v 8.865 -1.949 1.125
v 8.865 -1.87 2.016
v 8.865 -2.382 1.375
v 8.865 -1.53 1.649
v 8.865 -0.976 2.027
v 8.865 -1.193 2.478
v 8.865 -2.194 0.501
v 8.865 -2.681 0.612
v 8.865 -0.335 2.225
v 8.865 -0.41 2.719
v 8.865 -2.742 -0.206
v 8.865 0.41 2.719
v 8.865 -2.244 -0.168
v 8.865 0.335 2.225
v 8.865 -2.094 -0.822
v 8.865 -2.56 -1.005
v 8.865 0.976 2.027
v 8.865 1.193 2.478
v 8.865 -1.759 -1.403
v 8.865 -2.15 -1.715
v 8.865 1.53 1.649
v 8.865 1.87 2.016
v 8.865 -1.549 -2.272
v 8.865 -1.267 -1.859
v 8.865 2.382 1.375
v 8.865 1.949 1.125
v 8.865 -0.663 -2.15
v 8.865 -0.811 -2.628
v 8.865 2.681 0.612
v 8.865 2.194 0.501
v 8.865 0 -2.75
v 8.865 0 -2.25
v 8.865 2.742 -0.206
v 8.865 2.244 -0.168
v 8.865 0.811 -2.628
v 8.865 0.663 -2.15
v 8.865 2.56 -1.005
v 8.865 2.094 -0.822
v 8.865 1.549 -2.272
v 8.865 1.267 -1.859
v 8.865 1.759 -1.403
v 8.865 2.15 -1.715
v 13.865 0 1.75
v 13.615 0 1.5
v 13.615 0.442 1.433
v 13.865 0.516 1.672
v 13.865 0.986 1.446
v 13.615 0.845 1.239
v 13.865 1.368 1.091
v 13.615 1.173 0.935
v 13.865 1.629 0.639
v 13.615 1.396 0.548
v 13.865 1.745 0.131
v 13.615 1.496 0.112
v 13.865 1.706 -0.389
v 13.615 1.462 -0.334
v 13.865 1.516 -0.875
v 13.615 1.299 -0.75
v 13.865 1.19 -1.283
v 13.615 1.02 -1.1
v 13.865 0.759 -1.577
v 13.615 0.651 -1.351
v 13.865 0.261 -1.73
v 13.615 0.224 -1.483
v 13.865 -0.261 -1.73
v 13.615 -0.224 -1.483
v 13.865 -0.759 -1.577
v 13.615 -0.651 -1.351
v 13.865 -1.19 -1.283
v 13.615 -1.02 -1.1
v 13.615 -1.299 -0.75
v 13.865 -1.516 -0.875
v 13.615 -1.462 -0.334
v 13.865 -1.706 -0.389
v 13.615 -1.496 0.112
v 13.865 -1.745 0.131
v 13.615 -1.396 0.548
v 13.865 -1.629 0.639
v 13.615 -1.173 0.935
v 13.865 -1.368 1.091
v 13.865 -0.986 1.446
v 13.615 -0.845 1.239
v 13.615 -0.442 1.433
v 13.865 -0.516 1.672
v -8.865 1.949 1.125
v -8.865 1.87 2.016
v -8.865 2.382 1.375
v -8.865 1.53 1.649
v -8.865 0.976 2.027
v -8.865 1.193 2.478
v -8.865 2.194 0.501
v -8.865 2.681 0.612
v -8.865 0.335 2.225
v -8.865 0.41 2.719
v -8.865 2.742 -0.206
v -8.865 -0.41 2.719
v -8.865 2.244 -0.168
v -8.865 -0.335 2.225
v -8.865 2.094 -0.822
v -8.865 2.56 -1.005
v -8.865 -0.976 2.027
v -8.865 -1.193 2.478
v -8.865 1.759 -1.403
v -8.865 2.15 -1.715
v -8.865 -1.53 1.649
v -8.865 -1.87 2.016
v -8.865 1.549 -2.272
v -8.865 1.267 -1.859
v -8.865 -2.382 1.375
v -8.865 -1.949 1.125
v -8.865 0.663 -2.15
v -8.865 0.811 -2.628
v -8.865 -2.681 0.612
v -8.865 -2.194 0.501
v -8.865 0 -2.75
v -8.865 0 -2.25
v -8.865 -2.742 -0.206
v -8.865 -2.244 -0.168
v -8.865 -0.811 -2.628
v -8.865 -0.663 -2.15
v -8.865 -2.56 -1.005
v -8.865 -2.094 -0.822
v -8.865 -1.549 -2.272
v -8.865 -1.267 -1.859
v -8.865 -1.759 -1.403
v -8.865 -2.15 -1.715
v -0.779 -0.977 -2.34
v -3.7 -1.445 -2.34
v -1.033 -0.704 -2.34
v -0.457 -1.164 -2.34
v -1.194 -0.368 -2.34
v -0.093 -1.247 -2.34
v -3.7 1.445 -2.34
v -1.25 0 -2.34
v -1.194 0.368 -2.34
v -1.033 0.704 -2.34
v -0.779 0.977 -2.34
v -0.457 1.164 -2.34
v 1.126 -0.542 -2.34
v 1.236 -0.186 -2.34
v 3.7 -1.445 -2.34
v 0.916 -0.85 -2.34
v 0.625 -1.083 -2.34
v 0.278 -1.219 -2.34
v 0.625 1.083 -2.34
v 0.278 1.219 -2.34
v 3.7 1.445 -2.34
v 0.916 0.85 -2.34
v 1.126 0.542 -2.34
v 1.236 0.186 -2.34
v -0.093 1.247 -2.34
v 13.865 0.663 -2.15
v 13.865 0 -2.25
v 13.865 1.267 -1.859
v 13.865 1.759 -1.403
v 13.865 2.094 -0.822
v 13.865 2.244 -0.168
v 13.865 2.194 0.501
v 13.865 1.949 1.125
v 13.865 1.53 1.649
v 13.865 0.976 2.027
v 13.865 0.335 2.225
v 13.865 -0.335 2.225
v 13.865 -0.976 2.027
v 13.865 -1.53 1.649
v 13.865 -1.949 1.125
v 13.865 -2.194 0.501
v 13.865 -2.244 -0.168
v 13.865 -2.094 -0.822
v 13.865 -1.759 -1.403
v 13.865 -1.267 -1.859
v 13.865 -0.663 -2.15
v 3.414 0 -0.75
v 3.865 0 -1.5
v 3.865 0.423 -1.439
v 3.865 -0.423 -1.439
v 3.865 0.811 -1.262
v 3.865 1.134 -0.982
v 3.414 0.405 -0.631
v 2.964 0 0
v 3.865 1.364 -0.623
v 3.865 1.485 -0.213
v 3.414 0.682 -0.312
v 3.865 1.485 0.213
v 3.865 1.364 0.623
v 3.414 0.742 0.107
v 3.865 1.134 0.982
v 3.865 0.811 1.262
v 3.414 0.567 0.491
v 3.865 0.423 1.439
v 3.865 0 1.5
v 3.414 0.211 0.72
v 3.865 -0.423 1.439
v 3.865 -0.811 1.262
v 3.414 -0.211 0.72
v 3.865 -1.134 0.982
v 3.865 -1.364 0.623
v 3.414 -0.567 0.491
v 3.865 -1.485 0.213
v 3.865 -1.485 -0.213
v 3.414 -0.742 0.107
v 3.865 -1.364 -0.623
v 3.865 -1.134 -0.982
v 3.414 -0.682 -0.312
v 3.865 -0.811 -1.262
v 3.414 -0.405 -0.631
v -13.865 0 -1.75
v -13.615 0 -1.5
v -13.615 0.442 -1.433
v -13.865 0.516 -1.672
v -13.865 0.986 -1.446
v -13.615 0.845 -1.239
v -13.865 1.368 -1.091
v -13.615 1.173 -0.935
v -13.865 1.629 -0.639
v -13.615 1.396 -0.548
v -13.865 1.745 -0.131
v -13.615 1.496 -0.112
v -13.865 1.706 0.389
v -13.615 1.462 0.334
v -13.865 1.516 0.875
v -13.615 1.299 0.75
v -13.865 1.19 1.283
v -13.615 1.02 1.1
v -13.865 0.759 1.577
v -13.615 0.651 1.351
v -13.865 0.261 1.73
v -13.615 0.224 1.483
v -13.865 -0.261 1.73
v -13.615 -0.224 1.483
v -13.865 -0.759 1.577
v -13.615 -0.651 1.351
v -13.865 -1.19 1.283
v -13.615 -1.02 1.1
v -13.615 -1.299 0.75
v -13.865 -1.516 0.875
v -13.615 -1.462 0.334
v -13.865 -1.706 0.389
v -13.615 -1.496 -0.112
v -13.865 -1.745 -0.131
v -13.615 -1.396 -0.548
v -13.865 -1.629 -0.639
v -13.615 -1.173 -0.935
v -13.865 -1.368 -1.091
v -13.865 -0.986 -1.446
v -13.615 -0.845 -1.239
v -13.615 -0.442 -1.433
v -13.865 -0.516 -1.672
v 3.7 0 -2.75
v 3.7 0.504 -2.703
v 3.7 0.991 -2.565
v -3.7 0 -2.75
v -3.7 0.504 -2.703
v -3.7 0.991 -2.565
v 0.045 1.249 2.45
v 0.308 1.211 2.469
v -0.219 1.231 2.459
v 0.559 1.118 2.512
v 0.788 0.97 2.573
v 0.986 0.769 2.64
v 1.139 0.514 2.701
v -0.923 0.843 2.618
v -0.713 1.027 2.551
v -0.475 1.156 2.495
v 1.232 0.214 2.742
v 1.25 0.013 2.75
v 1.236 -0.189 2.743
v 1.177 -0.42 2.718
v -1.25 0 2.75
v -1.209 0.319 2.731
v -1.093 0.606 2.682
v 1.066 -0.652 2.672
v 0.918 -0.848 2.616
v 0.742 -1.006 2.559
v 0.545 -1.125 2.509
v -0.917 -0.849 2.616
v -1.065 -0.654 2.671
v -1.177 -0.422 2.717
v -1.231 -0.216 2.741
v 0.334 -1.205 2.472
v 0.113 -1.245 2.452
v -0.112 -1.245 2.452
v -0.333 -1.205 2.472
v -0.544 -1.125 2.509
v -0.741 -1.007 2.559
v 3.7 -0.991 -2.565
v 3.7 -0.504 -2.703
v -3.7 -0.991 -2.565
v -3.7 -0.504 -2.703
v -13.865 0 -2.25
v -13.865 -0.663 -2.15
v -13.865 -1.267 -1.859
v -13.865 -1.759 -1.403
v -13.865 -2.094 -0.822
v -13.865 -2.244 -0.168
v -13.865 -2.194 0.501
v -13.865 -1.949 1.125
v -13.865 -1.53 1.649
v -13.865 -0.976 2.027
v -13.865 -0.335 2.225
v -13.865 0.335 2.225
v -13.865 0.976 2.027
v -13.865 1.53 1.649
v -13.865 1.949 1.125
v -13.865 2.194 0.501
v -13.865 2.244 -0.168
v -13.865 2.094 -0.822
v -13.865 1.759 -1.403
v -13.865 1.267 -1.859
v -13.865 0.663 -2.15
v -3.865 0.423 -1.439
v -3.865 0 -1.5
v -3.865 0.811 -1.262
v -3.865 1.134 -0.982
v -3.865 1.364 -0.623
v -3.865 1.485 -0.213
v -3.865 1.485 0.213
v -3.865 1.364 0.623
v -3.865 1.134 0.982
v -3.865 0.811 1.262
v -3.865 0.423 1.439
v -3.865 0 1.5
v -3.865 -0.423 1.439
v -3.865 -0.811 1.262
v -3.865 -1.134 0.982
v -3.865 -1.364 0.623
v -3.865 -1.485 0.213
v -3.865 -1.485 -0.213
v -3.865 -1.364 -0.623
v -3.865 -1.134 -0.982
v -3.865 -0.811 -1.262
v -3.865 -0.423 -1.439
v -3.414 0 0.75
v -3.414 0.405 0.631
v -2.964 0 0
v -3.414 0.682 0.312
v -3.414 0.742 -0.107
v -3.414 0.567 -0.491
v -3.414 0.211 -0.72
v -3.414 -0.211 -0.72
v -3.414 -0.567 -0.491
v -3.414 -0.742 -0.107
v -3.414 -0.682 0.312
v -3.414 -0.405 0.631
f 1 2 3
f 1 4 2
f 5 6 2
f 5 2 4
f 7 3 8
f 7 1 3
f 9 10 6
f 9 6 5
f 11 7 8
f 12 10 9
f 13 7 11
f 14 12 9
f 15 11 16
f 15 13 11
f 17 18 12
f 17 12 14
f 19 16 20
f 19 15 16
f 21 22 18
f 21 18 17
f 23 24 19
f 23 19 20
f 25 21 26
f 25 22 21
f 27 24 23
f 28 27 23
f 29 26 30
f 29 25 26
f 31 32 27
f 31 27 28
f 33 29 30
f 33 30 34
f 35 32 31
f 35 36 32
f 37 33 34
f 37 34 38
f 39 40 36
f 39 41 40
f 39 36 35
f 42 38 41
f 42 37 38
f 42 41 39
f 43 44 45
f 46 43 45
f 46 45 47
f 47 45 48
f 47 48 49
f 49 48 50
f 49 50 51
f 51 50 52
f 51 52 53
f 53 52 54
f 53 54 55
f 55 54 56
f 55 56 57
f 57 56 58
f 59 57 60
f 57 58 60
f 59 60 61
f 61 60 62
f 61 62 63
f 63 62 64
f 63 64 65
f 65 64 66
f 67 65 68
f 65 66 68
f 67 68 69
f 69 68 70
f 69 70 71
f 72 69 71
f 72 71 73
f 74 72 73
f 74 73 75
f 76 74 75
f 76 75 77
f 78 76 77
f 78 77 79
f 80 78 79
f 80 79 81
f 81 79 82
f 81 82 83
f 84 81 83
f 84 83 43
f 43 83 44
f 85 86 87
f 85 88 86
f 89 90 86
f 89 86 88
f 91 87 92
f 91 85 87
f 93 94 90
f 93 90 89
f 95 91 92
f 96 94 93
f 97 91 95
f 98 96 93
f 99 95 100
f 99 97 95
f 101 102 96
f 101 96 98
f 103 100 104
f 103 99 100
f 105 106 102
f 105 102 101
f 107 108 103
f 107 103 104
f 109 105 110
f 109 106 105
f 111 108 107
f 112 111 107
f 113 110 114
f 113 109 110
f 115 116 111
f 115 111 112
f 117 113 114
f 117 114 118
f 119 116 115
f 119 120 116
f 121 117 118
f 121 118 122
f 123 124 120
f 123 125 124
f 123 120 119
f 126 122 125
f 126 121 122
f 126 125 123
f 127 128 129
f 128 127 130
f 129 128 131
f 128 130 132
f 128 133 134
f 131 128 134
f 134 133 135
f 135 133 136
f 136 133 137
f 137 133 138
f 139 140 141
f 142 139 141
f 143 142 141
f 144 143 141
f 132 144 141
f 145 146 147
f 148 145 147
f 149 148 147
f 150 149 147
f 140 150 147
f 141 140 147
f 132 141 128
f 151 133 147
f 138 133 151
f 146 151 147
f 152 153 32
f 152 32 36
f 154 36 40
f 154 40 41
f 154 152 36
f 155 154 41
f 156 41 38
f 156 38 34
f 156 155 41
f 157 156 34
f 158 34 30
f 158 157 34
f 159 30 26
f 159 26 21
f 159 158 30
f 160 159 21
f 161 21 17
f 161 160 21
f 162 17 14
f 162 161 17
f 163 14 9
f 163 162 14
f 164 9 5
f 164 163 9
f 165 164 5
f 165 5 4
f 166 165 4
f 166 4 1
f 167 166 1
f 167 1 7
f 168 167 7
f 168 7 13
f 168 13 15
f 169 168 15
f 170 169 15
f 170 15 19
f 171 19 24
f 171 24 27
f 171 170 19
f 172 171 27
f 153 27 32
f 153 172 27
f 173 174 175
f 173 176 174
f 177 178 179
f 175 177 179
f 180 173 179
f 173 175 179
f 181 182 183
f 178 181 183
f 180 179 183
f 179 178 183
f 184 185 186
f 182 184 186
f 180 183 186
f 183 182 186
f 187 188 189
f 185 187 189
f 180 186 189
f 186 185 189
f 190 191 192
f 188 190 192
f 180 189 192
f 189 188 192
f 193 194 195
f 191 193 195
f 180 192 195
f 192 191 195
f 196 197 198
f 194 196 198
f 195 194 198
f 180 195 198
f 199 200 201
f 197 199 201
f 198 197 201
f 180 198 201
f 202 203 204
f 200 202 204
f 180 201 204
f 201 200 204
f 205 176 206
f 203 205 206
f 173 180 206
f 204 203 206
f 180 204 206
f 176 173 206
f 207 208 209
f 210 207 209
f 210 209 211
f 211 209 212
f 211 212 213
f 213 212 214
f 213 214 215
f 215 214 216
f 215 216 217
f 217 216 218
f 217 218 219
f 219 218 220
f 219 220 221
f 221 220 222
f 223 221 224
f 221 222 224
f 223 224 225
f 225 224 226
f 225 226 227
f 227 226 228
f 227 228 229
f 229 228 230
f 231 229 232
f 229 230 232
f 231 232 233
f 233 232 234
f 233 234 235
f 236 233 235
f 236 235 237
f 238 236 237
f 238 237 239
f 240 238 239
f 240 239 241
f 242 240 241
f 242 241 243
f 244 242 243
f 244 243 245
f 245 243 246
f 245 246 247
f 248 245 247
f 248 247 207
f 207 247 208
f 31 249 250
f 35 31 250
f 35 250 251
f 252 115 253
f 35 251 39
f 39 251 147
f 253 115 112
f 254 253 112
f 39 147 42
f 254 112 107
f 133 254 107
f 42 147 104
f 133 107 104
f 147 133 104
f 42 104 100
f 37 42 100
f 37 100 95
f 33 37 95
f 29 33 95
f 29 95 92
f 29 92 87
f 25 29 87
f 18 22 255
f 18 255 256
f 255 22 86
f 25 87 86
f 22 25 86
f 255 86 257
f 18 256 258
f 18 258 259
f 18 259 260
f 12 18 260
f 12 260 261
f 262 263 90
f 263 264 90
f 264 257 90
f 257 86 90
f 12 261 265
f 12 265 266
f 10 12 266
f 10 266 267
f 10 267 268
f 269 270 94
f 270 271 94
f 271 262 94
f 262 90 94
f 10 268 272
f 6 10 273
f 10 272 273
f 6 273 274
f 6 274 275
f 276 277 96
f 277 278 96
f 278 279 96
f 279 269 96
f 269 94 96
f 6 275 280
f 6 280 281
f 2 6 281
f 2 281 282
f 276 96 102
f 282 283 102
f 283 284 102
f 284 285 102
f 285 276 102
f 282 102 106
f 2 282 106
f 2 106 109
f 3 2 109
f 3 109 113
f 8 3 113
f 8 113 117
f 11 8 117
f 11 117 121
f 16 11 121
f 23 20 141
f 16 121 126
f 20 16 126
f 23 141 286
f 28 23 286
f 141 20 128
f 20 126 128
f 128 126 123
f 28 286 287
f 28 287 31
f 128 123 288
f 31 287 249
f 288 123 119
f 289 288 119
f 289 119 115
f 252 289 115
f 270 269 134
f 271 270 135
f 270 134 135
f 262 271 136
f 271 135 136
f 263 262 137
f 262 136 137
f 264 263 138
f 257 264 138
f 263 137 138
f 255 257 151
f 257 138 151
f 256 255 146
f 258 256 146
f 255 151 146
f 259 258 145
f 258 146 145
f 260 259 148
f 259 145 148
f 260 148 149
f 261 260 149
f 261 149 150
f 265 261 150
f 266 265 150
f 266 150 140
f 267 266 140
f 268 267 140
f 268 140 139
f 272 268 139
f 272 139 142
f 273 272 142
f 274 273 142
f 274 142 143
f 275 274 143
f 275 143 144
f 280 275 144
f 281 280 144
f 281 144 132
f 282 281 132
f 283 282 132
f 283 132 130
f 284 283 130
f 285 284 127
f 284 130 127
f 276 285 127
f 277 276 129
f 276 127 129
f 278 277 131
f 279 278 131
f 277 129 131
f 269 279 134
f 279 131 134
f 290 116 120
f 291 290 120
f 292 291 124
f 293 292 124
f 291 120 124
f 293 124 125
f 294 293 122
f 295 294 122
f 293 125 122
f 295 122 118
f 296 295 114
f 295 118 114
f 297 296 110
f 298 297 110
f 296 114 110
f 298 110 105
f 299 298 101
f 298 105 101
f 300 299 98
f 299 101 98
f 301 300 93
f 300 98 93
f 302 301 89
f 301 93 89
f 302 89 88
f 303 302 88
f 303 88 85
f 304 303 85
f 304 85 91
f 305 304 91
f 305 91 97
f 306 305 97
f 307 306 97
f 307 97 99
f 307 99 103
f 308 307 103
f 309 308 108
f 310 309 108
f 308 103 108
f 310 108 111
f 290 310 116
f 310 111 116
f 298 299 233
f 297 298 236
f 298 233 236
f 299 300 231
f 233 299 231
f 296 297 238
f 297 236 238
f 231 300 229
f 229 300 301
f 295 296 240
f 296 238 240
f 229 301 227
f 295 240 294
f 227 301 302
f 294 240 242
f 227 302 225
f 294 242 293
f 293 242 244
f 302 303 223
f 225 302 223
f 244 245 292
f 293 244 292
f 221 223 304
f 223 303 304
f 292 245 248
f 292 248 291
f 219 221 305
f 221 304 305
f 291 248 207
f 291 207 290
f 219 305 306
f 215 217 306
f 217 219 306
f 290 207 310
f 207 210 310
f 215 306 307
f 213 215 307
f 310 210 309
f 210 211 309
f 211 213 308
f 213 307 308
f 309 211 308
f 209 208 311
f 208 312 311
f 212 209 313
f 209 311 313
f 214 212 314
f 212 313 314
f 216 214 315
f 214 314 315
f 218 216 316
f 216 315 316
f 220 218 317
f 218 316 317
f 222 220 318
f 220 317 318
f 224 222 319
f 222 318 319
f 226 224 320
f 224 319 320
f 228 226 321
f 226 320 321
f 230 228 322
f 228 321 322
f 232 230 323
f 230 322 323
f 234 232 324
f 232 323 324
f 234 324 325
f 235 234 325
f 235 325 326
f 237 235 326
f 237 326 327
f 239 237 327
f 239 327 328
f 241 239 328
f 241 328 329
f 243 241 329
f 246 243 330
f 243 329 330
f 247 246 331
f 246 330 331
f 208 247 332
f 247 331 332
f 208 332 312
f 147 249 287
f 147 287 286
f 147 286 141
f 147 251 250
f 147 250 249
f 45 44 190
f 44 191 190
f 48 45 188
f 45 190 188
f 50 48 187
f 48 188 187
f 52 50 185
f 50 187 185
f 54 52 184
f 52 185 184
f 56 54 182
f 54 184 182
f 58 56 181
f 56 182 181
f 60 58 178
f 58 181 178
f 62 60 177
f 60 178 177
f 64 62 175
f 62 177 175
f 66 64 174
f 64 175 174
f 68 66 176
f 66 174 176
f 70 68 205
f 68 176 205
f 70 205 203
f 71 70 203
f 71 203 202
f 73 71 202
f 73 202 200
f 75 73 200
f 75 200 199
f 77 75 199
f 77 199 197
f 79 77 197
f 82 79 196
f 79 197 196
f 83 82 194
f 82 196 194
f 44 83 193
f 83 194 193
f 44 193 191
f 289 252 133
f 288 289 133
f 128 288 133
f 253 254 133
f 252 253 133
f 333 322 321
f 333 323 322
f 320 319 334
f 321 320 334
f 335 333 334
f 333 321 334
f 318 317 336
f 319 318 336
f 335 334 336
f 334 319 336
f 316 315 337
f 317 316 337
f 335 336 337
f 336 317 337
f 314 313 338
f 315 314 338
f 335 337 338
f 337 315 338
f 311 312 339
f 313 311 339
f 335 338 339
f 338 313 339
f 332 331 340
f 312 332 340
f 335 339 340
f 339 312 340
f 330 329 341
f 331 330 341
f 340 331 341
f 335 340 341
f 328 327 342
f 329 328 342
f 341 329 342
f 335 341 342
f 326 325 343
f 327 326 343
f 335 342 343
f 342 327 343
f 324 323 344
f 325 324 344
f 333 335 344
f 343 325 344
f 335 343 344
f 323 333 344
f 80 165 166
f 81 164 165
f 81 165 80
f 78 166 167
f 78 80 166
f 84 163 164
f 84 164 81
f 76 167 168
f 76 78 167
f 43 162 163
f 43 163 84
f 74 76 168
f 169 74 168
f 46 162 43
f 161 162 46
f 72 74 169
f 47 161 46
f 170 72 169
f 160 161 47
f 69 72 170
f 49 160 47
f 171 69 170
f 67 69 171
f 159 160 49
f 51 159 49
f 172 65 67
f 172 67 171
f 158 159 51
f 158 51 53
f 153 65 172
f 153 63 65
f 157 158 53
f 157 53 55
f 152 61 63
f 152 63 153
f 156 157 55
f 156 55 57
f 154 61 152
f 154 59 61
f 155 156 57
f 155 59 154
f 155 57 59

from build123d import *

# Parameters (mm, degrees)
BOSS_EXTRUDE1_DEPTH                                 = 13.865
BOSS_EXTRUDE1_DEPTH_BACK                            = 13.865
SKETCH1_R                                           = 2.75
SKETCH2_R                                           = 2.75
SKETCH2_R_2                                         = 2.25
CUT_EXTRUDE1_DEPTH                                  = 5
CUT_EXTRUDE2_START                                  = -5
SKETCH3_R                                           = 2.75
SKETCH3_R_2                                         = 2.25
CUT_EXTRUDE2_DEPTH                                  = 5
CSK_FOR_M3_COUNTERSUNK_FLAT_HEAD_SCREW1_D           = 3
CSK_FOR_M3_COUNTERSUNK_FLAT_HEAD_SCREW1_DEPTH       = 10
CSK_FOR_M3_COUNTERSUNK_FLAT_HEAD_SCREW1_CSINK_D     = 3.5
CSK_FOR_M3_COUNTERSUNK_FLAT_HEAD_SCREW1_CSINK_ANGLE = 90
CSK_FOR_M3_COUNTERSUNK_FLAT_HEAD_SCREW1_TIP         = 0.901290929
CSK_FOR_M3_COUNTERSUNK_FLAT_HEAD_SCREW2_D           = 3
CSK_FOR_M3_COUNTERSUNK_FLAT_HEAD_SCREW2_DEPTH       = 10
CSK_FOR_M3_COUNTERSUNK_FLAT_HEAD_SCREW2_CSINK_D     = 3.5
CSK_FOR_M3_COUNTERSUNK_FLAT_HEAD_SCREW2_CSINK_ANGLE = 90
CSK_FOR_M3_COUNTERSUNK_FLAT_HEAD_SCREW2_TIP         = 0.901290929
SKETCH8_W                                           = 7.4
SKETCH8_H                                           = 4
CUT_EXTRUDE3_DEPTH                                  = 3
SKETCH9_R                                           = 1.25
CUT_EXTRUDE4_DEPTH                                  = 16.023608921


with BuildPart() as part:
    # Sketch1 → Boss-Extrude1 (new, two sides: drawn at the far end of the back side and taken through both)
    with BuildSketch(Plane(origin=(0, 0, 0), x_dir=(0, 0, -1), z_dir=(1, 0, 0)).offset(-BOSS_EXTRUDE1_DEPTH_BACK)):
        Circle(SKETCH1_R)
    extrude(amount=BOSS_EXTRUDE1_DEPTH + BOSS_EXTRUDE1_DEPTH_BACK)

    # Sketch2 → Cut-Extrude1 (cut)
    with BuildSketch(Plane(origin=(13.865, 0, 0), x_dir=(0, 0, -1), z_dir=(1, 0, 0))):
        Circle(SKETCH2_R)
        Circle(SKETCH2_R_2, mode=Mode.SUBTRACT)
    extrude(amount=-CUT_EXTRUDE1_DEPTH, mode=Mode.SUBTRACT)

    # Sketch3 → Cut-Extrude2 (cut)
    with BuildSketch(Plane.ZY.offset(13.865).offset(CUT_EXTRUDE2_START)):
        Circle(SKETCH3_R)
        Circle(SKETCH3_R_2, mode=Mode.SUBTRACT)
    extrude(amount=CUT_EXTRUDE2_DEPTH, mode=Mode.SUBTRACT)

    # CSK for M3 Countersunk Flat Head Screw1
    with Locations(Plane.ZY.offset(13.865)):
        with Locations((0, 0)):
            CounterSinkHole(CSK_FOR_M3_COUNTERSUNK_FLAT_HEAD_SCREW1_D / 2, CSK_FOR_M3_COUNTERSUNK_FLAT_HEAD_SCREW1_CSINK_D / 2, depth=CSK_FOR_M3_COUNTERSUNK_FLAT_HEAD_SCREW1_DEPTH, counter_sink_angle=CSK_FOR_M3_COUNTERSUNK_FLAT_HEAD_SCREW1_CSINK_ANGLE)
            with Locations((0, 0, -(CSK_FOR_M3_COUNTERSUNK_FLAT_HEAD_SCREW1_DEPTH + CSK_FOR_M3_COUNTERSUNK_FLAT_HEAD_SCREW1_TIP / 2))):  # 118° drill point
                Cone(0, CSK_FOR_M3_COUNTERSUNK_FLAT_HEAD_SCREW1_D / 2, CSK_FOR_M3_COUNTERSUNK_FLAT_HEAD_SCREW1_TIP, mode=Mode.SUBTRACT)

    # CSK for M3 Countersunk Flat Head Screw2
    with Locations(Plane(origin=(13.865, 0, 0), x_dir=(0, 0, -1), z_dir=(1, 0, 0))):
        with Locations((0, 0)):
            CounterSinkHole(CSK_FOR_M3_COUNTERSUNK_FLAT_HEAD_SCREW2_D / 2, CSK_FOR_M3_COUNTERSUNK_FLAT_HEAD_SCREW2_CSINK_D / 2, depth=CSK_FOR_M3_COUNTERSUNK_FLAT_HEAD_SCREW2_DEPTH, counter_sink_angle=CSK_FOR_M3_COUNTERSUNK_FLAT_HEAD_SCREW2_CSINK_ANGLE)
            with Locations((0, 0, -(CSK_FOR_M3_COUNTERSUNK_FLAT_HEAD_SCREW2_DEPTH + CSK_FOR_M3_COUNTERSUNK_FLAT_HEAD_SCREW2_TIP / 2))):  # 118° drill point
                Cone(0, CSK_FOR_M3_COUNTERSUNK_FLAT_HEAD_SCREW2_D / 2, CSK_FOR_M3_COUNTERSUNK_FLAT_HEAD_SCREW2_TIP, mode=Mode.SUBTRACT)

    # Sketch8 → Cut-Extrude3 (cut)
    with BuildSketch(Plane.XY.offset(-5.34)):
        Rectangle(SKETCH8_W, SKETCH8_H)
    extrude(amount=CUT_EXTRUDE3_DEPTH, mode=Mode.SUBTRACT)

    # Sketch9 → Cut-Extrude4 (cut, through all)
    with BuildSketch(Plane(origin=(0, 0, -2.34), x_dir=(-1, 0, 0), z_dir=(0, 0, -1))):
        Circle(SKETCH9_R)
    extrude(amount=-CUT_EXTRUDE4_DEPTH, mode=Mode.SUBTRACT)


solid = part.part
